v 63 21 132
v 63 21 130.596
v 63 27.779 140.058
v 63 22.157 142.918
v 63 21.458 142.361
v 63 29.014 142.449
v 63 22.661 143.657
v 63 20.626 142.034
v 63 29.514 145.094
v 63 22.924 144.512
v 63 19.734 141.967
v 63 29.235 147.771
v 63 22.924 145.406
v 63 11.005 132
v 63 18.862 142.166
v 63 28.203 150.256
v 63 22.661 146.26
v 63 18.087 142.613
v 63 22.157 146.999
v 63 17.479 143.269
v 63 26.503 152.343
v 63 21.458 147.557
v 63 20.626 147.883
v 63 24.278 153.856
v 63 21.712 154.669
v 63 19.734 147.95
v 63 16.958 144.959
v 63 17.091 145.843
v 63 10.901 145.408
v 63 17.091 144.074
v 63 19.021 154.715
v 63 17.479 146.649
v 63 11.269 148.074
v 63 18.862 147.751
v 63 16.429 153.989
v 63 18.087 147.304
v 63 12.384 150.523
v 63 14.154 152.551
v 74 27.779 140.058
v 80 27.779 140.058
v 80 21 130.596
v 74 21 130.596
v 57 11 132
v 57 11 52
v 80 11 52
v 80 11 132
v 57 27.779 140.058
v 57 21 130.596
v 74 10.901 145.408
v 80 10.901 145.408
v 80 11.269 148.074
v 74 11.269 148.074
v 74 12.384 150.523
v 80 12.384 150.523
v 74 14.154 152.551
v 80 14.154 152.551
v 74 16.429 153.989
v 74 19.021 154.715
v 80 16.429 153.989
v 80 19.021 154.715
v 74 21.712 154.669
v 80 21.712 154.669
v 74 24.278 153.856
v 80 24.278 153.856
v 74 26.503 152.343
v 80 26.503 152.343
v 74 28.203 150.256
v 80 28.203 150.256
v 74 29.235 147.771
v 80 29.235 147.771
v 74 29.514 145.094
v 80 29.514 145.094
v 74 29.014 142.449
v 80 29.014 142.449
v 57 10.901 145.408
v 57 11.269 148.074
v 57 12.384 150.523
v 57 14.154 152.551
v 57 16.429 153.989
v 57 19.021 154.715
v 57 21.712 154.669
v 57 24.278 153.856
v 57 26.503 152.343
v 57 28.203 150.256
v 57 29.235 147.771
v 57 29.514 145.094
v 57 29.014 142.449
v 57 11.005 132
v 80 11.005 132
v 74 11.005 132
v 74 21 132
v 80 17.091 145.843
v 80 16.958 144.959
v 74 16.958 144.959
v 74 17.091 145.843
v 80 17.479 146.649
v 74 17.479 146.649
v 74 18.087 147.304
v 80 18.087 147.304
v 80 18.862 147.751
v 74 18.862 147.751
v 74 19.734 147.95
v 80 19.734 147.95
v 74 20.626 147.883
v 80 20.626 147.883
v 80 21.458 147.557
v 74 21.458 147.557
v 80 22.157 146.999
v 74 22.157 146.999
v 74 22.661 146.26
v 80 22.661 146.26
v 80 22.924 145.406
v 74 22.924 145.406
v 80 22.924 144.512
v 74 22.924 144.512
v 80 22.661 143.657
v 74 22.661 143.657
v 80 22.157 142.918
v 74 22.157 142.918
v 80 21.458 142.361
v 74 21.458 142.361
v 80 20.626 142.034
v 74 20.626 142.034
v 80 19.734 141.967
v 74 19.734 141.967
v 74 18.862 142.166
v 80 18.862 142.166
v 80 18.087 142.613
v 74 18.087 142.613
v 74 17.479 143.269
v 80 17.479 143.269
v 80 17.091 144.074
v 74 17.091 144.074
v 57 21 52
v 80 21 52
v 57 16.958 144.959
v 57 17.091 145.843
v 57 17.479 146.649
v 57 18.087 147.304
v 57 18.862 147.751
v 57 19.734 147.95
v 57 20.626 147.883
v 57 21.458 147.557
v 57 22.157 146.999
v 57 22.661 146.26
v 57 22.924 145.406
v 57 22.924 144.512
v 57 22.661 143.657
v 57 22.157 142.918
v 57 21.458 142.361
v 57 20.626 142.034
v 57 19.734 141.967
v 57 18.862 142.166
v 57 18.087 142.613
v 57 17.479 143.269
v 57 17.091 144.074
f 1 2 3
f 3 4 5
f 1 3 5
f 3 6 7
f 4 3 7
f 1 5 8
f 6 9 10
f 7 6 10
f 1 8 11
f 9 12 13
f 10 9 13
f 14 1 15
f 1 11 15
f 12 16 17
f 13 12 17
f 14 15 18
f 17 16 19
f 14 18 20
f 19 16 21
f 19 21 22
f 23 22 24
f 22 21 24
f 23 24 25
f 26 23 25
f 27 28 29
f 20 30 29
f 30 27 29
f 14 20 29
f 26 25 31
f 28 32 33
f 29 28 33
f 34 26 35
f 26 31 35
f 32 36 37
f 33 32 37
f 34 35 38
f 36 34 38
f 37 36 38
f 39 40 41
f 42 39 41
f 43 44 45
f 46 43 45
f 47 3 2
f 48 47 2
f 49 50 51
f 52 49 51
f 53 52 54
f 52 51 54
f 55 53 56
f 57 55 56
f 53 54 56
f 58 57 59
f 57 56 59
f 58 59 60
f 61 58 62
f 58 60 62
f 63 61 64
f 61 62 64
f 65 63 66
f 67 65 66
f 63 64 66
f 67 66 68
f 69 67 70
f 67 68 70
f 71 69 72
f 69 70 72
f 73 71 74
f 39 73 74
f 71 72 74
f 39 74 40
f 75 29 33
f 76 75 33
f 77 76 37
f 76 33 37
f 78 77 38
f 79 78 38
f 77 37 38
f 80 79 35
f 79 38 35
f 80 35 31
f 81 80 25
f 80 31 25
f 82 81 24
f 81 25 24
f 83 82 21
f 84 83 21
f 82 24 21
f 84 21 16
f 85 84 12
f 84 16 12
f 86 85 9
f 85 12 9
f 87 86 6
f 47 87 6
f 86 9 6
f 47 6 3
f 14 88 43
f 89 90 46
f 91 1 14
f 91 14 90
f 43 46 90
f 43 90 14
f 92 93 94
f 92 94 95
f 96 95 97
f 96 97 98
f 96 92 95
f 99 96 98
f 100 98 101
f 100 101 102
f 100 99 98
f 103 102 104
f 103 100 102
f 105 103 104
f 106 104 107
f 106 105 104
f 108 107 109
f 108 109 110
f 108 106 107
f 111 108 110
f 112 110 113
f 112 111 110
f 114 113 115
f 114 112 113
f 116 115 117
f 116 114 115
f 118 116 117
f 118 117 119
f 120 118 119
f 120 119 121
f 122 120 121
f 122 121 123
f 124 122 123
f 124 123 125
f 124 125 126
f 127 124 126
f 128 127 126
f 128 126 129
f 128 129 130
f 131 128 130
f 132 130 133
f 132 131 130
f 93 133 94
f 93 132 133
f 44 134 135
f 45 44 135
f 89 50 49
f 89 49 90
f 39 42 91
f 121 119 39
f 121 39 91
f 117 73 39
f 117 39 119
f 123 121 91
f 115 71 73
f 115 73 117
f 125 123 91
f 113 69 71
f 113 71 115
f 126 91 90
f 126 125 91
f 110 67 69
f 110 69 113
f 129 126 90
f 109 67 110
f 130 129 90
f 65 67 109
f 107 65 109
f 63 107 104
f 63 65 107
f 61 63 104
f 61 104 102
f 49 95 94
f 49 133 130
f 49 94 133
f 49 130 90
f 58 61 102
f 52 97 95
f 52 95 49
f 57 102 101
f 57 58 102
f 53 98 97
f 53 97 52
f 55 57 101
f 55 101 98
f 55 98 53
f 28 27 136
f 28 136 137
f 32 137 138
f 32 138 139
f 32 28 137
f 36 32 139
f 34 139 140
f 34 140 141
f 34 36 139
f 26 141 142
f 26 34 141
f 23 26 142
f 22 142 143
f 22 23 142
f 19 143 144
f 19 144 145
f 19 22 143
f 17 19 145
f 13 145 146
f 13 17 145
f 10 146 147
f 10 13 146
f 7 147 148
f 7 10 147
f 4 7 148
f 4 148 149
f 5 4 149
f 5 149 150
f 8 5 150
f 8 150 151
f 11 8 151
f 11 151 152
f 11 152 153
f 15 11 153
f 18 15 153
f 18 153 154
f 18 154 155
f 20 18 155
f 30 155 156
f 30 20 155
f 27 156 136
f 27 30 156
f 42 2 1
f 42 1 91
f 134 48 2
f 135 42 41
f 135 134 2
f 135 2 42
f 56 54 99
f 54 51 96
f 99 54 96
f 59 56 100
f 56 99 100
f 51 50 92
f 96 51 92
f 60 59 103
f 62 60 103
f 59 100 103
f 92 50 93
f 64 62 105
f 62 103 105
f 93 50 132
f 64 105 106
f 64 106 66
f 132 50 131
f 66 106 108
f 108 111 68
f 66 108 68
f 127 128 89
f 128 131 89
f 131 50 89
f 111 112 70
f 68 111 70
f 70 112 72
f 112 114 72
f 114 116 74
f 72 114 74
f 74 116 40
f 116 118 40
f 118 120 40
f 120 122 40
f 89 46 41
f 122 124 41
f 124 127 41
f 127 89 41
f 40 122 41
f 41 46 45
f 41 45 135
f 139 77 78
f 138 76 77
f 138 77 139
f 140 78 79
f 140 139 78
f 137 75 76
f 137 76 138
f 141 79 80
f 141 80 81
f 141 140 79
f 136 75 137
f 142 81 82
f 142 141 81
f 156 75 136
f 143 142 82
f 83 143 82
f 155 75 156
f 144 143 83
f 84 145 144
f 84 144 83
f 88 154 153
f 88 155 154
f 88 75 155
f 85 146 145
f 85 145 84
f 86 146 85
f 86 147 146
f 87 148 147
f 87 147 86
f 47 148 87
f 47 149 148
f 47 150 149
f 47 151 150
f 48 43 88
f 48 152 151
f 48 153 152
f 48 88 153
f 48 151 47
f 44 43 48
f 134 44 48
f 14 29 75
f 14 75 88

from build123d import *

# Parameters (mm, degrees)
SKETCH014_R      = 3
EXTRUDE013_DEPTH = 6
BOX025_W         = 23
BOX025_H         = 10
BOX025_DEPTH     = 80


with BuildPart() as union_brazo_central:
    # Sketch014 → Extrude013 (new body)
    with BuildSketch(Plane(origin=(0, 0, 0), x_dir=(0, -1, 0), z_dir=(-1, 0, 0))):
        with BuildLine():
            ThreePointArc((-10.900695, 145.407872), (-23.024313, 154.355924), (-27.779278, 140.057671))
            Line((-27.779278, 140.057671), (-20.026942, 129.238365))
            Line((-20.026942, 129.238365), (-11.026942, 129.238365))
            Line((-10.900695, 145.407872), (-11.026942, 129.238365))
        make_face()
        with Locations((-19.957954, 144.958669)):
            Circle(SKETCH014_R, mode=Mode.SUBTRACT)
    extrude(amount=EXTRUDE013_DEPTH)


with BuildPart() as union_brazo_central_1:
    # Extrude013 placement: moved
    add(union_brazo_central.part.moved(Location((63, 0, 0))))


with BuildPart() as main_brazo_central:
    # Box025 → Box025 (new body)
    with BuildSketch(Plane(origin=(57, 11, 52), x_dir=(1, 0, 0), z_dir=(0, 0, 1))):
        with Locations((11.5, 5)):
            Rectangle(BOX025_W, BOX025_H)
    extrude(amount=BOX025_DEPTH)


with BuildPart() as brazo_central:
    # Link017 base: copy of Union brazo central
    add(union_brazo_central_1.part)


with BuildPart() as brazo_central_1:
    # Link017 placement: moved
    add(brazo_central.part.moved(Location((17, 0, 0))))

    # Fusion021: union Union brazo central, main brazo central
    add(union_brazo_central_1.part)
    add(main_brazo_central.part)


solid = brazo_central_1.part
